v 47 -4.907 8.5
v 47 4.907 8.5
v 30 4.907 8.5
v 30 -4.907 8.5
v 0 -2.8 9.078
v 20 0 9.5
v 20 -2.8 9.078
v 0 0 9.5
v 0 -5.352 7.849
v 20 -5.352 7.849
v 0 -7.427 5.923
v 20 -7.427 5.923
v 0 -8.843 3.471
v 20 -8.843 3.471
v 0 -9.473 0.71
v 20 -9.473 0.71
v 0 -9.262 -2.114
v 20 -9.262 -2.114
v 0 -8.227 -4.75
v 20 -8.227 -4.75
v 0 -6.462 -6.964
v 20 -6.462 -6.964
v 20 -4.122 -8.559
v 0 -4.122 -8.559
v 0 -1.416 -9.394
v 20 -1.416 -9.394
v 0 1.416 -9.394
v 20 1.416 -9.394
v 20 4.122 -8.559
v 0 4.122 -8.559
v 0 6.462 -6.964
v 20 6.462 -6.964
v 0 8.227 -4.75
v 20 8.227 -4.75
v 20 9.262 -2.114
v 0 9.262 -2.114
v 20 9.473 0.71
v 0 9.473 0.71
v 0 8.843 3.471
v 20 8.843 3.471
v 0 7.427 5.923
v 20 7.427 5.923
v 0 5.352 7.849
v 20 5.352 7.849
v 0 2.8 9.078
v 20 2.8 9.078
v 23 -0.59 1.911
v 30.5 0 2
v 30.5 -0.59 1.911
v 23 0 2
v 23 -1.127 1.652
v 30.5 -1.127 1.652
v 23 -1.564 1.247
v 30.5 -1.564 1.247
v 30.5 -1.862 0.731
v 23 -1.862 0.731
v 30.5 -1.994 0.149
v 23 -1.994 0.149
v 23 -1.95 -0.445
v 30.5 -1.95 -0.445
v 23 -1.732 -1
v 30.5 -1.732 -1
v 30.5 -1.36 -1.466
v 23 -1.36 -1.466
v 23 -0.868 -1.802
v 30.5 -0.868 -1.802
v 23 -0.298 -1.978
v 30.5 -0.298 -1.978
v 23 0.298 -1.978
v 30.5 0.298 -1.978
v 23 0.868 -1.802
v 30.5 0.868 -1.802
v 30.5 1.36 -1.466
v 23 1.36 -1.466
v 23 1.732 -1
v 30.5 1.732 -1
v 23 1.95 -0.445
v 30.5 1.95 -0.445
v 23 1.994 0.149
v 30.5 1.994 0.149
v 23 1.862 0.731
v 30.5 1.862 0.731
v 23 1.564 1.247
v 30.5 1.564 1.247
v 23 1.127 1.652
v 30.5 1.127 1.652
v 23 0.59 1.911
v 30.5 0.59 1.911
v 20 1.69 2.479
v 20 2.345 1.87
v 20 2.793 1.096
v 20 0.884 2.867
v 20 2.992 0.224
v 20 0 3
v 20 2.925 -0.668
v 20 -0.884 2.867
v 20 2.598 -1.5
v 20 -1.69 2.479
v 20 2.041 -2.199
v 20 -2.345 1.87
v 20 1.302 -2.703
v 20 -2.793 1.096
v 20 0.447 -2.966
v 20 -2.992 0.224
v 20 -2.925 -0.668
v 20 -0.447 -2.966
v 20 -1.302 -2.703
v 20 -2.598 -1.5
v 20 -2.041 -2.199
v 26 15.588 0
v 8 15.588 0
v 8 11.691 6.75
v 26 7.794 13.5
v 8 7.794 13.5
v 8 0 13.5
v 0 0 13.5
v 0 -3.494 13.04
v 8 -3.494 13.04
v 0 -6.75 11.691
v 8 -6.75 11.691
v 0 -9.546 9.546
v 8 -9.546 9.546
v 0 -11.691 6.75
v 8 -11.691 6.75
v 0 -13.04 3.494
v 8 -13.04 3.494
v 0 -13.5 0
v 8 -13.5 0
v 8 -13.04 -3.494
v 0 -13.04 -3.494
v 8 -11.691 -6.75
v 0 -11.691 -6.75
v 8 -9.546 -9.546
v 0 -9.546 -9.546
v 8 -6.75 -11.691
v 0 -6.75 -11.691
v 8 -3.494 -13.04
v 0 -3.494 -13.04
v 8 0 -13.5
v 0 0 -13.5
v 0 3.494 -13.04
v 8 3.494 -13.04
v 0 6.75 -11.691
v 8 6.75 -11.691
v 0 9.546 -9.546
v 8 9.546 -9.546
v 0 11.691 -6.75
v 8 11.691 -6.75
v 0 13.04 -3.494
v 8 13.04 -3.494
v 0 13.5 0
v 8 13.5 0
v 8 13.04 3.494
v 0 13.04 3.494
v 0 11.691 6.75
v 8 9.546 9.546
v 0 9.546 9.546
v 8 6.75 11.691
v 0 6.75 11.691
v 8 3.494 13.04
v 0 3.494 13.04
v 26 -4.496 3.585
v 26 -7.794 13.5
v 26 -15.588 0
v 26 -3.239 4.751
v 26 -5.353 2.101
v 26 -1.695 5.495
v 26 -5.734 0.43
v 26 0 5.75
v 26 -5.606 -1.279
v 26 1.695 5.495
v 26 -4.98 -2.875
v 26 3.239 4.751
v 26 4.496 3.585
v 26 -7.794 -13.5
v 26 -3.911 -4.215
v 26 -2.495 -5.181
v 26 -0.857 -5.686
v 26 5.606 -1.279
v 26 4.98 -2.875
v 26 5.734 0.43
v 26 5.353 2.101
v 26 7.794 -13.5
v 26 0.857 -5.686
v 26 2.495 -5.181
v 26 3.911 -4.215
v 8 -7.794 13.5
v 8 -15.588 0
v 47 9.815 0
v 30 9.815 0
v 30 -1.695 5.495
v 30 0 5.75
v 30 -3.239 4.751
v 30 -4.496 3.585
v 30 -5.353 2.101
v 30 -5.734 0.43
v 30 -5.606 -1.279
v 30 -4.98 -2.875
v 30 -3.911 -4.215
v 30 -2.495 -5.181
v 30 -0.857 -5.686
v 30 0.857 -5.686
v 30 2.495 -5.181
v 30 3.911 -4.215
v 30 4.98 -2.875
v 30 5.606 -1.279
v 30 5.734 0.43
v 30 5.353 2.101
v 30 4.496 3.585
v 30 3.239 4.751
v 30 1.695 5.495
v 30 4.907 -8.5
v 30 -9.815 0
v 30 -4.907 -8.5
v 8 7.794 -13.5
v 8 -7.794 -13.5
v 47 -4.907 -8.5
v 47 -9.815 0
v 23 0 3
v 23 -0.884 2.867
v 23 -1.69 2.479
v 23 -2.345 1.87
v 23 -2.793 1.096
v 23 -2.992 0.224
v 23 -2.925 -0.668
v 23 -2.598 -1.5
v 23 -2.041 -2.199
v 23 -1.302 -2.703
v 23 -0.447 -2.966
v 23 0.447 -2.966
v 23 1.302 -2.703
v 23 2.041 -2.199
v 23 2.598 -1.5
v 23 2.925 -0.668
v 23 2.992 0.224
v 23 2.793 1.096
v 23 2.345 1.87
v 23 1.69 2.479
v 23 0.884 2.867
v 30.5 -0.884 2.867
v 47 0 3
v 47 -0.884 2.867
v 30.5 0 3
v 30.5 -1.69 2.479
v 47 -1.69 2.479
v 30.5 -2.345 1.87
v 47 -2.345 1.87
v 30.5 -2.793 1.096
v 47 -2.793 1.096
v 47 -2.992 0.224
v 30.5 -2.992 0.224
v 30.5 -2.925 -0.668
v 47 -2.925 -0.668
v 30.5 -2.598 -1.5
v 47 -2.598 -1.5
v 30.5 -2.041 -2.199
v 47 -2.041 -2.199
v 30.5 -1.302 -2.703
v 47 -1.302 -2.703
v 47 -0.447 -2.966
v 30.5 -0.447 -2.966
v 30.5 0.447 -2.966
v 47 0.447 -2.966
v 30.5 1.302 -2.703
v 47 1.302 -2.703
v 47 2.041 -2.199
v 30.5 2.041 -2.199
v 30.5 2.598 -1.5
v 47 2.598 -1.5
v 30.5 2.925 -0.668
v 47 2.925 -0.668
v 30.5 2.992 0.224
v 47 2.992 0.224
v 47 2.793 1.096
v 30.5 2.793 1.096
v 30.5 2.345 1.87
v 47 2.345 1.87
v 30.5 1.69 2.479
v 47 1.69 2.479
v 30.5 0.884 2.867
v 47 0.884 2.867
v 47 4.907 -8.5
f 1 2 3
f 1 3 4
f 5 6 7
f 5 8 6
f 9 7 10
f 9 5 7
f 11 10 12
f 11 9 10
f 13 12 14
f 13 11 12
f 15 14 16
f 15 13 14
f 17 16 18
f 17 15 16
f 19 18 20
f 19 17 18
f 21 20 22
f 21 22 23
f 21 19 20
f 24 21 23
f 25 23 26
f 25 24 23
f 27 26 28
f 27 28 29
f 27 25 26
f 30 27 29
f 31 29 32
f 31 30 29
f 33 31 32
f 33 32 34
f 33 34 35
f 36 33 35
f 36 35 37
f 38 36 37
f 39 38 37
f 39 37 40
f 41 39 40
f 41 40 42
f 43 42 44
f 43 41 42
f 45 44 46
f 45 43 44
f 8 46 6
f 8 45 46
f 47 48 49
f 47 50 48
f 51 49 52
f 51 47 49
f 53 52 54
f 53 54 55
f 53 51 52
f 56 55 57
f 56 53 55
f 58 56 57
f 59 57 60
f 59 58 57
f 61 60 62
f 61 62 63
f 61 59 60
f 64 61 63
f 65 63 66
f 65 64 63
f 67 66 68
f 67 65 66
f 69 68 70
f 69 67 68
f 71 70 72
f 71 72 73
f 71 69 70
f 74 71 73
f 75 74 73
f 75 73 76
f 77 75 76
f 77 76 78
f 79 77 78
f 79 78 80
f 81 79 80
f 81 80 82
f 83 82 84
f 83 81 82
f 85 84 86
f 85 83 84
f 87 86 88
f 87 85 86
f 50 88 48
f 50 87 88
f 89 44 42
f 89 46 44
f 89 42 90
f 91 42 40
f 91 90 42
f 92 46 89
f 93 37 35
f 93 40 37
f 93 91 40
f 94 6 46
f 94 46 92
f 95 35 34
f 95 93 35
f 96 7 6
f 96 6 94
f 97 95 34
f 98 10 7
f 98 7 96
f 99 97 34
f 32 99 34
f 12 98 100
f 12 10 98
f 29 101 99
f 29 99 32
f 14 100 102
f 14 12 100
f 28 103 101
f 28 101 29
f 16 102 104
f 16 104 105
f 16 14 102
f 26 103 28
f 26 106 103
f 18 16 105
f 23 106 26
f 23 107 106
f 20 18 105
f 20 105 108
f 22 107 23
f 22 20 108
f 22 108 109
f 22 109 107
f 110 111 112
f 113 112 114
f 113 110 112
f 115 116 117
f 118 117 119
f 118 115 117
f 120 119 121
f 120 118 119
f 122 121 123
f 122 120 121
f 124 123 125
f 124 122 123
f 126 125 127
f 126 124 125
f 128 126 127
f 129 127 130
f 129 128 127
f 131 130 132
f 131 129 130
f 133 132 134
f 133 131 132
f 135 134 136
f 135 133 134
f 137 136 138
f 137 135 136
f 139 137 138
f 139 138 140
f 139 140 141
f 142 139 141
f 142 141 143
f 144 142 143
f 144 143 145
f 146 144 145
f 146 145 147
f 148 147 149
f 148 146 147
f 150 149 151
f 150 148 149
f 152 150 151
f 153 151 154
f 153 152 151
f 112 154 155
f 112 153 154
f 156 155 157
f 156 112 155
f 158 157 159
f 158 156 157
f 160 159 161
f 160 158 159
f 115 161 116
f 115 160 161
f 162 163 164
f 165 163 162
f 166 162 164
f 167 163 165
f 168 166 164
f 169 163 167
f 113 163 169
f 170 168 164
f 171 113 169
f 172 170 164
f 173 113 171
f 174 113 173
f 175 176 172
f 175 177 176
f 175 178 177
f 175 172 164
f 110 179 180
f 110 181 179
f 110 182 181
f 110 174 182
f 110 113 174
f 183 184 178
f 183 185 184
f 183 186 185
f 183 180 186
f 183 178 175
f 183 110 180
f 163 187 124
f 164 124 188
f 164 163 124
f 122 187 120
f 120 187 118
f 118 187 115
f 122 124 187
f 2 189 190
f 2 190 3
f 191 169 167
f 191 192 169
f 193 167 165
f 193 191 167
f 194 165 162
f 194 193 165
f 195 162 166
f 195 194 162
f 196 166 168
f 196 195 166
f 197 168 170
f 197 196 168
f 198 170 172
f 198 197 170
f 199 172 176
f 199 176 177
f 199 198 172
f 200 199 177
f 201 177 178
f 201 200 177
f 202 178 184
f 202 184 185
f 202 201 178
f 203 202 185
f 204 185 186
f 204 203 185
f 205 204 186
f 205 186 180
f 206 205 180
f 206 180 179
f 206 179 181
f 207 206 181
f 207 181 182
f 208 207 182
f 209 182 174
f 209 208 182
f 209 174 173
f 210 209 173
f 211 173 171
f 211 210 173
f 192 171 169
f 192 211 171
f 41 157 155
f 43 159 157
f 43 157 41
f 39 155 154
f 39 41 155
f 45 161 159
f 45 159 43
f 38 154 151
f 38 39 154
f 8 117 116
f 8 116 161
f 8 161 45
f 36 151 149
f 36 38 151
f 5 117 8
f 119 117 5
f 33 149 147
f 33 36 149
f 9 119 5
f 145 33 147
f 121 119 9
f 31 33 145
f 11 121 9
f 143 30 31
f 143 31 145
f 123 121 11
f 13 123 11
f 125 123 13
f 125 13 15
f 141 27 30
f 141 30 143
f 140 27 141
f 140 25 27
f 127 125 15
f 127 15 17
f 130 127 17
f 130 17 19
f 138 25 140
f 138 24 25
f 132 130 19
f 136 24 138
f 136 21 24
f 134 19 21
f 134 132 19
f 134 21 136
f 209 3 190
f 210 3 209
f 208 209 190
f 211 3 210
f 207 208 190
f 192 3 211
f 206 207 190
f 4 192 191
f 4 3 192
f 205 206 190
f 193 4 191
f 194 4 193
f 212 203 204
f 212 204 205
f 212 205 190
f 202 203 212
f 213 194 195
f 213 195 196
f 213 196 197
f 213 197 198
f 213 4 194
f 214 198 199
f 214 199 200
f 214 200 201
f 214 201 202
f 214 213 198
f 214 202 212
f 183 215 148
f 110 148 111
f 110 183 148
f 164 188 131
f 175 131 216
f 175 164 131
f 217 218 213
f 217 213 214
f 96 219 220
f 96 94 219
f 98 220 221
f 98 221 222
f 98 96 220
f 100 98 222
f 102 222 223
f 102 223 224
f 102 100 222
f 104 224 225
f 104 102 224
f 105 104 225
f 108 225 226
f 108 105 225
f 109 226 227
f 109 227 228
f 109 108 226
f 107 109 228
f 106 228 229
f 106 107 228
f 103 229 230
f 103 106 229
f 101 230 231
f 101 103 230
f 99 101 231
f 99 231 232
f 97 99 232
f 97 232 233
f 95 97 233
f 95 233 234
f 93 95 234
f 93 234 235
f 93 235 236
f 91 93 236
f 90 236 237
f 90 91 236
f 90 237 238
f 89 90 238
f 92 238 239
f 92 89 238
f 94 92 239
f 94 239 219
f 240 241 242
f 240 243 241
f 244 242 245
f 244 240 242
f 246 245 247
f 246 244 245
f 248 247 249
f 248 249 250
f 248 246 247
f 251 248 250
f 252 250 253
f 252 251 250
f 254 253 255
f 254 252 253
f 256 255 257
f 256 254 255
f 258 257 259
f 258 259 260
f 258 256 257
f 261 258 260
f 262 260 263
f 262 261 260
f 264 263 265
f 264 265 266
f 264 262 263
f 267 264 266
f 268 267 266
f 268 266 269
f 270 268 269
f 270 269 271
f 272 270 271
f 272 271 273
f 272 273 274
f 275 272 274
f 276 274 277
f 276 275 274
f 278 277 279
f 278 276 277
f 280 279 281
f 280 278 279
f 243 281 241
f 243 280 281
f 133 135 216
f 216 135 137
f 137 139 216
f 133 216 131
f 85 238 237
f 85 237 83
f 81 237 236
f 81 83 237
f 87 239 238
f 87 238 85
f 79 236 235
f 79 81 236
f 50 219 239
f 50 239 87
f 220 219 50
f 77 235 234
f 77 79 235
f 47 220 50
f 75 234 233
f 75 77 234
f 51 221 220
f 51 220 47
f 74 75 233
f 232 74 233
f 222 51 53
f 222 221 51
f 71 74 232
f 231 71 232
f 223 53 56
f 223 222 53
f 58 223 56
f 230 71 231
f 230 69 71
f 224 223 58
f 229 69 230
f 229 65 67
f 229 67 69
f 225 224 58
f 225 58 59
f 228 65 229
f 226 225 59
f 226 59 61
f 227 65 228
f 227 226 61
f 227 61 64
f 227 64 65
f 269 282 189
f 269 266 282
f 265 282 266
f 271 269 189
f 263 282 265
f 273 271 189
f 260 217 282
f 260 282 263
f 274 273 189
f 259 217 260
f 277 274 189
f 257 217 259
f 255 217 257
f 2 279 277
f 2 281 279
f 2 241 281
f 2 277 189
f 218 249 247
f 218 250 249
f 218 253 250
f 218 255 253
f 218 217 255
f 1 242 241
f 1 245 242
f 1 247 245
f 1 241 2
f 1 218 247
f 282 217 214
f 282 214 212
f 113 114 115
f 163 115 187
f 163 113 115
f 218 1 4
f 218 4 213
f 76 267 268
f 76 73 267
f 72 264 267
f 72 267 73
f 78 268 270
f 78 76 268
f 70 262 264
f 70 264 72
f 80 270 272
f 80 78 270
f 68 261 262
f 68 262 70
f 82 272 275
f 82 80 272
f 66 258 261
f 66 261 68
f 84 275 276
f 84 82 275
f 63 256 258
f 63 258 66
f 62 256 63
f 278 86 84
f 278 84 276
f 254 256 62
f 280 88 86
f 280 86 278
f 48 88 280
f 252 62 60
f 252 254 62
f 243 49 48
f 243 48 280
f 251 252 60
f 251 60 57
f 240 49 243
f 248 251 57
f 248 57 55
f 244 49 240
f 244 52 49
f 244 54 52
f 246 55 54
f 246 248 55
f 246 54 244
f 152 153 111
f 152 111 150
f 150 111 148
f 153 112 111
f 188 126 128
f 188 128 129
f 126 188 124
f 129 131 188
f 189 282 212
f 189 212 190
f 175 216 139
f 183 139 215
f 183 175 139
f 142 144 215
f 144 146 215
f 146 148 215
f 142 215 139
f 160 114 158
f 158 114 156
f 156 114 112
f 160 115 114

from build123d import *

# Parameters (mm, degrees)
SKICA2_R                 = 11.379305307
ODEBRAT_VYSUNUT_M1_DEPTH = 18
SKICA3_R                 = 12.741299312
P_IDAT_VYSUNUT_M1_DEPTH  = 18


with BuildPart() as part:
    # Skica1 → Rotovat1 (revolve)
    with BuildSketch(Plane.XY, mode=Mode.PRIVATE) as rotovat1_sk:
        Polygon((0, 9.5), (0, 13.5), (26, 13.5), (26, 5.75), (30, 5.75), (30, 10), (47, 10), (47, 3), (30.5, 3), (30.5, 2), (23, 2), (23, 3), (20, 3), (20, 9.5), align=None)
    revolve(rotovat1_sk.sketch.rotate(Axis((0, 0, 0), (1, 0, 0)), 90), axis=Axis((0, 0, 0), (1, 0, 0)))

    # Skica2 → Odebrat vysunutím1 (cut)
    with BuildSketch(Plane(origin=(47, 0, 0), x_dir=(0, 0, -1), z_dir=(1, 0, 0))):
        Circle(SKICA2_R)
        Polygon((0, 9.814954576), (-8.5, 4.907477288), (-8.5, -4.907477288), (0, -9.814954576), (8.5, -4.907477288), (8.5, 4.907477288), align=None, mode=Mode.SUBTRACT)
    extrude(amount=-ODEBRAT_VYSUNUT_M1_DEPTH, mode=Mode.SUBTRACT)

    # Skica3 → Přidat vysunutím1 (add)
    with BuildSketch(Plane(origin=(26, 0, 0), x_dir=(0, 0, -1), z_dir=(1, 0, 0))):
        Polygon((0, 15.588457268), (-13.5, 7.794228634), (-13.5, -7.794228634), (0, -15.588457268), (13.5, -7.794228634), (13.5, 7.794228634), align=None)
        Circle(SKICA3_R, mode=Mode.SUBTRACT)
    extrude(amount=-P_IDAT_VYSUNUT_M1_DEPTH)


solid = part.part
